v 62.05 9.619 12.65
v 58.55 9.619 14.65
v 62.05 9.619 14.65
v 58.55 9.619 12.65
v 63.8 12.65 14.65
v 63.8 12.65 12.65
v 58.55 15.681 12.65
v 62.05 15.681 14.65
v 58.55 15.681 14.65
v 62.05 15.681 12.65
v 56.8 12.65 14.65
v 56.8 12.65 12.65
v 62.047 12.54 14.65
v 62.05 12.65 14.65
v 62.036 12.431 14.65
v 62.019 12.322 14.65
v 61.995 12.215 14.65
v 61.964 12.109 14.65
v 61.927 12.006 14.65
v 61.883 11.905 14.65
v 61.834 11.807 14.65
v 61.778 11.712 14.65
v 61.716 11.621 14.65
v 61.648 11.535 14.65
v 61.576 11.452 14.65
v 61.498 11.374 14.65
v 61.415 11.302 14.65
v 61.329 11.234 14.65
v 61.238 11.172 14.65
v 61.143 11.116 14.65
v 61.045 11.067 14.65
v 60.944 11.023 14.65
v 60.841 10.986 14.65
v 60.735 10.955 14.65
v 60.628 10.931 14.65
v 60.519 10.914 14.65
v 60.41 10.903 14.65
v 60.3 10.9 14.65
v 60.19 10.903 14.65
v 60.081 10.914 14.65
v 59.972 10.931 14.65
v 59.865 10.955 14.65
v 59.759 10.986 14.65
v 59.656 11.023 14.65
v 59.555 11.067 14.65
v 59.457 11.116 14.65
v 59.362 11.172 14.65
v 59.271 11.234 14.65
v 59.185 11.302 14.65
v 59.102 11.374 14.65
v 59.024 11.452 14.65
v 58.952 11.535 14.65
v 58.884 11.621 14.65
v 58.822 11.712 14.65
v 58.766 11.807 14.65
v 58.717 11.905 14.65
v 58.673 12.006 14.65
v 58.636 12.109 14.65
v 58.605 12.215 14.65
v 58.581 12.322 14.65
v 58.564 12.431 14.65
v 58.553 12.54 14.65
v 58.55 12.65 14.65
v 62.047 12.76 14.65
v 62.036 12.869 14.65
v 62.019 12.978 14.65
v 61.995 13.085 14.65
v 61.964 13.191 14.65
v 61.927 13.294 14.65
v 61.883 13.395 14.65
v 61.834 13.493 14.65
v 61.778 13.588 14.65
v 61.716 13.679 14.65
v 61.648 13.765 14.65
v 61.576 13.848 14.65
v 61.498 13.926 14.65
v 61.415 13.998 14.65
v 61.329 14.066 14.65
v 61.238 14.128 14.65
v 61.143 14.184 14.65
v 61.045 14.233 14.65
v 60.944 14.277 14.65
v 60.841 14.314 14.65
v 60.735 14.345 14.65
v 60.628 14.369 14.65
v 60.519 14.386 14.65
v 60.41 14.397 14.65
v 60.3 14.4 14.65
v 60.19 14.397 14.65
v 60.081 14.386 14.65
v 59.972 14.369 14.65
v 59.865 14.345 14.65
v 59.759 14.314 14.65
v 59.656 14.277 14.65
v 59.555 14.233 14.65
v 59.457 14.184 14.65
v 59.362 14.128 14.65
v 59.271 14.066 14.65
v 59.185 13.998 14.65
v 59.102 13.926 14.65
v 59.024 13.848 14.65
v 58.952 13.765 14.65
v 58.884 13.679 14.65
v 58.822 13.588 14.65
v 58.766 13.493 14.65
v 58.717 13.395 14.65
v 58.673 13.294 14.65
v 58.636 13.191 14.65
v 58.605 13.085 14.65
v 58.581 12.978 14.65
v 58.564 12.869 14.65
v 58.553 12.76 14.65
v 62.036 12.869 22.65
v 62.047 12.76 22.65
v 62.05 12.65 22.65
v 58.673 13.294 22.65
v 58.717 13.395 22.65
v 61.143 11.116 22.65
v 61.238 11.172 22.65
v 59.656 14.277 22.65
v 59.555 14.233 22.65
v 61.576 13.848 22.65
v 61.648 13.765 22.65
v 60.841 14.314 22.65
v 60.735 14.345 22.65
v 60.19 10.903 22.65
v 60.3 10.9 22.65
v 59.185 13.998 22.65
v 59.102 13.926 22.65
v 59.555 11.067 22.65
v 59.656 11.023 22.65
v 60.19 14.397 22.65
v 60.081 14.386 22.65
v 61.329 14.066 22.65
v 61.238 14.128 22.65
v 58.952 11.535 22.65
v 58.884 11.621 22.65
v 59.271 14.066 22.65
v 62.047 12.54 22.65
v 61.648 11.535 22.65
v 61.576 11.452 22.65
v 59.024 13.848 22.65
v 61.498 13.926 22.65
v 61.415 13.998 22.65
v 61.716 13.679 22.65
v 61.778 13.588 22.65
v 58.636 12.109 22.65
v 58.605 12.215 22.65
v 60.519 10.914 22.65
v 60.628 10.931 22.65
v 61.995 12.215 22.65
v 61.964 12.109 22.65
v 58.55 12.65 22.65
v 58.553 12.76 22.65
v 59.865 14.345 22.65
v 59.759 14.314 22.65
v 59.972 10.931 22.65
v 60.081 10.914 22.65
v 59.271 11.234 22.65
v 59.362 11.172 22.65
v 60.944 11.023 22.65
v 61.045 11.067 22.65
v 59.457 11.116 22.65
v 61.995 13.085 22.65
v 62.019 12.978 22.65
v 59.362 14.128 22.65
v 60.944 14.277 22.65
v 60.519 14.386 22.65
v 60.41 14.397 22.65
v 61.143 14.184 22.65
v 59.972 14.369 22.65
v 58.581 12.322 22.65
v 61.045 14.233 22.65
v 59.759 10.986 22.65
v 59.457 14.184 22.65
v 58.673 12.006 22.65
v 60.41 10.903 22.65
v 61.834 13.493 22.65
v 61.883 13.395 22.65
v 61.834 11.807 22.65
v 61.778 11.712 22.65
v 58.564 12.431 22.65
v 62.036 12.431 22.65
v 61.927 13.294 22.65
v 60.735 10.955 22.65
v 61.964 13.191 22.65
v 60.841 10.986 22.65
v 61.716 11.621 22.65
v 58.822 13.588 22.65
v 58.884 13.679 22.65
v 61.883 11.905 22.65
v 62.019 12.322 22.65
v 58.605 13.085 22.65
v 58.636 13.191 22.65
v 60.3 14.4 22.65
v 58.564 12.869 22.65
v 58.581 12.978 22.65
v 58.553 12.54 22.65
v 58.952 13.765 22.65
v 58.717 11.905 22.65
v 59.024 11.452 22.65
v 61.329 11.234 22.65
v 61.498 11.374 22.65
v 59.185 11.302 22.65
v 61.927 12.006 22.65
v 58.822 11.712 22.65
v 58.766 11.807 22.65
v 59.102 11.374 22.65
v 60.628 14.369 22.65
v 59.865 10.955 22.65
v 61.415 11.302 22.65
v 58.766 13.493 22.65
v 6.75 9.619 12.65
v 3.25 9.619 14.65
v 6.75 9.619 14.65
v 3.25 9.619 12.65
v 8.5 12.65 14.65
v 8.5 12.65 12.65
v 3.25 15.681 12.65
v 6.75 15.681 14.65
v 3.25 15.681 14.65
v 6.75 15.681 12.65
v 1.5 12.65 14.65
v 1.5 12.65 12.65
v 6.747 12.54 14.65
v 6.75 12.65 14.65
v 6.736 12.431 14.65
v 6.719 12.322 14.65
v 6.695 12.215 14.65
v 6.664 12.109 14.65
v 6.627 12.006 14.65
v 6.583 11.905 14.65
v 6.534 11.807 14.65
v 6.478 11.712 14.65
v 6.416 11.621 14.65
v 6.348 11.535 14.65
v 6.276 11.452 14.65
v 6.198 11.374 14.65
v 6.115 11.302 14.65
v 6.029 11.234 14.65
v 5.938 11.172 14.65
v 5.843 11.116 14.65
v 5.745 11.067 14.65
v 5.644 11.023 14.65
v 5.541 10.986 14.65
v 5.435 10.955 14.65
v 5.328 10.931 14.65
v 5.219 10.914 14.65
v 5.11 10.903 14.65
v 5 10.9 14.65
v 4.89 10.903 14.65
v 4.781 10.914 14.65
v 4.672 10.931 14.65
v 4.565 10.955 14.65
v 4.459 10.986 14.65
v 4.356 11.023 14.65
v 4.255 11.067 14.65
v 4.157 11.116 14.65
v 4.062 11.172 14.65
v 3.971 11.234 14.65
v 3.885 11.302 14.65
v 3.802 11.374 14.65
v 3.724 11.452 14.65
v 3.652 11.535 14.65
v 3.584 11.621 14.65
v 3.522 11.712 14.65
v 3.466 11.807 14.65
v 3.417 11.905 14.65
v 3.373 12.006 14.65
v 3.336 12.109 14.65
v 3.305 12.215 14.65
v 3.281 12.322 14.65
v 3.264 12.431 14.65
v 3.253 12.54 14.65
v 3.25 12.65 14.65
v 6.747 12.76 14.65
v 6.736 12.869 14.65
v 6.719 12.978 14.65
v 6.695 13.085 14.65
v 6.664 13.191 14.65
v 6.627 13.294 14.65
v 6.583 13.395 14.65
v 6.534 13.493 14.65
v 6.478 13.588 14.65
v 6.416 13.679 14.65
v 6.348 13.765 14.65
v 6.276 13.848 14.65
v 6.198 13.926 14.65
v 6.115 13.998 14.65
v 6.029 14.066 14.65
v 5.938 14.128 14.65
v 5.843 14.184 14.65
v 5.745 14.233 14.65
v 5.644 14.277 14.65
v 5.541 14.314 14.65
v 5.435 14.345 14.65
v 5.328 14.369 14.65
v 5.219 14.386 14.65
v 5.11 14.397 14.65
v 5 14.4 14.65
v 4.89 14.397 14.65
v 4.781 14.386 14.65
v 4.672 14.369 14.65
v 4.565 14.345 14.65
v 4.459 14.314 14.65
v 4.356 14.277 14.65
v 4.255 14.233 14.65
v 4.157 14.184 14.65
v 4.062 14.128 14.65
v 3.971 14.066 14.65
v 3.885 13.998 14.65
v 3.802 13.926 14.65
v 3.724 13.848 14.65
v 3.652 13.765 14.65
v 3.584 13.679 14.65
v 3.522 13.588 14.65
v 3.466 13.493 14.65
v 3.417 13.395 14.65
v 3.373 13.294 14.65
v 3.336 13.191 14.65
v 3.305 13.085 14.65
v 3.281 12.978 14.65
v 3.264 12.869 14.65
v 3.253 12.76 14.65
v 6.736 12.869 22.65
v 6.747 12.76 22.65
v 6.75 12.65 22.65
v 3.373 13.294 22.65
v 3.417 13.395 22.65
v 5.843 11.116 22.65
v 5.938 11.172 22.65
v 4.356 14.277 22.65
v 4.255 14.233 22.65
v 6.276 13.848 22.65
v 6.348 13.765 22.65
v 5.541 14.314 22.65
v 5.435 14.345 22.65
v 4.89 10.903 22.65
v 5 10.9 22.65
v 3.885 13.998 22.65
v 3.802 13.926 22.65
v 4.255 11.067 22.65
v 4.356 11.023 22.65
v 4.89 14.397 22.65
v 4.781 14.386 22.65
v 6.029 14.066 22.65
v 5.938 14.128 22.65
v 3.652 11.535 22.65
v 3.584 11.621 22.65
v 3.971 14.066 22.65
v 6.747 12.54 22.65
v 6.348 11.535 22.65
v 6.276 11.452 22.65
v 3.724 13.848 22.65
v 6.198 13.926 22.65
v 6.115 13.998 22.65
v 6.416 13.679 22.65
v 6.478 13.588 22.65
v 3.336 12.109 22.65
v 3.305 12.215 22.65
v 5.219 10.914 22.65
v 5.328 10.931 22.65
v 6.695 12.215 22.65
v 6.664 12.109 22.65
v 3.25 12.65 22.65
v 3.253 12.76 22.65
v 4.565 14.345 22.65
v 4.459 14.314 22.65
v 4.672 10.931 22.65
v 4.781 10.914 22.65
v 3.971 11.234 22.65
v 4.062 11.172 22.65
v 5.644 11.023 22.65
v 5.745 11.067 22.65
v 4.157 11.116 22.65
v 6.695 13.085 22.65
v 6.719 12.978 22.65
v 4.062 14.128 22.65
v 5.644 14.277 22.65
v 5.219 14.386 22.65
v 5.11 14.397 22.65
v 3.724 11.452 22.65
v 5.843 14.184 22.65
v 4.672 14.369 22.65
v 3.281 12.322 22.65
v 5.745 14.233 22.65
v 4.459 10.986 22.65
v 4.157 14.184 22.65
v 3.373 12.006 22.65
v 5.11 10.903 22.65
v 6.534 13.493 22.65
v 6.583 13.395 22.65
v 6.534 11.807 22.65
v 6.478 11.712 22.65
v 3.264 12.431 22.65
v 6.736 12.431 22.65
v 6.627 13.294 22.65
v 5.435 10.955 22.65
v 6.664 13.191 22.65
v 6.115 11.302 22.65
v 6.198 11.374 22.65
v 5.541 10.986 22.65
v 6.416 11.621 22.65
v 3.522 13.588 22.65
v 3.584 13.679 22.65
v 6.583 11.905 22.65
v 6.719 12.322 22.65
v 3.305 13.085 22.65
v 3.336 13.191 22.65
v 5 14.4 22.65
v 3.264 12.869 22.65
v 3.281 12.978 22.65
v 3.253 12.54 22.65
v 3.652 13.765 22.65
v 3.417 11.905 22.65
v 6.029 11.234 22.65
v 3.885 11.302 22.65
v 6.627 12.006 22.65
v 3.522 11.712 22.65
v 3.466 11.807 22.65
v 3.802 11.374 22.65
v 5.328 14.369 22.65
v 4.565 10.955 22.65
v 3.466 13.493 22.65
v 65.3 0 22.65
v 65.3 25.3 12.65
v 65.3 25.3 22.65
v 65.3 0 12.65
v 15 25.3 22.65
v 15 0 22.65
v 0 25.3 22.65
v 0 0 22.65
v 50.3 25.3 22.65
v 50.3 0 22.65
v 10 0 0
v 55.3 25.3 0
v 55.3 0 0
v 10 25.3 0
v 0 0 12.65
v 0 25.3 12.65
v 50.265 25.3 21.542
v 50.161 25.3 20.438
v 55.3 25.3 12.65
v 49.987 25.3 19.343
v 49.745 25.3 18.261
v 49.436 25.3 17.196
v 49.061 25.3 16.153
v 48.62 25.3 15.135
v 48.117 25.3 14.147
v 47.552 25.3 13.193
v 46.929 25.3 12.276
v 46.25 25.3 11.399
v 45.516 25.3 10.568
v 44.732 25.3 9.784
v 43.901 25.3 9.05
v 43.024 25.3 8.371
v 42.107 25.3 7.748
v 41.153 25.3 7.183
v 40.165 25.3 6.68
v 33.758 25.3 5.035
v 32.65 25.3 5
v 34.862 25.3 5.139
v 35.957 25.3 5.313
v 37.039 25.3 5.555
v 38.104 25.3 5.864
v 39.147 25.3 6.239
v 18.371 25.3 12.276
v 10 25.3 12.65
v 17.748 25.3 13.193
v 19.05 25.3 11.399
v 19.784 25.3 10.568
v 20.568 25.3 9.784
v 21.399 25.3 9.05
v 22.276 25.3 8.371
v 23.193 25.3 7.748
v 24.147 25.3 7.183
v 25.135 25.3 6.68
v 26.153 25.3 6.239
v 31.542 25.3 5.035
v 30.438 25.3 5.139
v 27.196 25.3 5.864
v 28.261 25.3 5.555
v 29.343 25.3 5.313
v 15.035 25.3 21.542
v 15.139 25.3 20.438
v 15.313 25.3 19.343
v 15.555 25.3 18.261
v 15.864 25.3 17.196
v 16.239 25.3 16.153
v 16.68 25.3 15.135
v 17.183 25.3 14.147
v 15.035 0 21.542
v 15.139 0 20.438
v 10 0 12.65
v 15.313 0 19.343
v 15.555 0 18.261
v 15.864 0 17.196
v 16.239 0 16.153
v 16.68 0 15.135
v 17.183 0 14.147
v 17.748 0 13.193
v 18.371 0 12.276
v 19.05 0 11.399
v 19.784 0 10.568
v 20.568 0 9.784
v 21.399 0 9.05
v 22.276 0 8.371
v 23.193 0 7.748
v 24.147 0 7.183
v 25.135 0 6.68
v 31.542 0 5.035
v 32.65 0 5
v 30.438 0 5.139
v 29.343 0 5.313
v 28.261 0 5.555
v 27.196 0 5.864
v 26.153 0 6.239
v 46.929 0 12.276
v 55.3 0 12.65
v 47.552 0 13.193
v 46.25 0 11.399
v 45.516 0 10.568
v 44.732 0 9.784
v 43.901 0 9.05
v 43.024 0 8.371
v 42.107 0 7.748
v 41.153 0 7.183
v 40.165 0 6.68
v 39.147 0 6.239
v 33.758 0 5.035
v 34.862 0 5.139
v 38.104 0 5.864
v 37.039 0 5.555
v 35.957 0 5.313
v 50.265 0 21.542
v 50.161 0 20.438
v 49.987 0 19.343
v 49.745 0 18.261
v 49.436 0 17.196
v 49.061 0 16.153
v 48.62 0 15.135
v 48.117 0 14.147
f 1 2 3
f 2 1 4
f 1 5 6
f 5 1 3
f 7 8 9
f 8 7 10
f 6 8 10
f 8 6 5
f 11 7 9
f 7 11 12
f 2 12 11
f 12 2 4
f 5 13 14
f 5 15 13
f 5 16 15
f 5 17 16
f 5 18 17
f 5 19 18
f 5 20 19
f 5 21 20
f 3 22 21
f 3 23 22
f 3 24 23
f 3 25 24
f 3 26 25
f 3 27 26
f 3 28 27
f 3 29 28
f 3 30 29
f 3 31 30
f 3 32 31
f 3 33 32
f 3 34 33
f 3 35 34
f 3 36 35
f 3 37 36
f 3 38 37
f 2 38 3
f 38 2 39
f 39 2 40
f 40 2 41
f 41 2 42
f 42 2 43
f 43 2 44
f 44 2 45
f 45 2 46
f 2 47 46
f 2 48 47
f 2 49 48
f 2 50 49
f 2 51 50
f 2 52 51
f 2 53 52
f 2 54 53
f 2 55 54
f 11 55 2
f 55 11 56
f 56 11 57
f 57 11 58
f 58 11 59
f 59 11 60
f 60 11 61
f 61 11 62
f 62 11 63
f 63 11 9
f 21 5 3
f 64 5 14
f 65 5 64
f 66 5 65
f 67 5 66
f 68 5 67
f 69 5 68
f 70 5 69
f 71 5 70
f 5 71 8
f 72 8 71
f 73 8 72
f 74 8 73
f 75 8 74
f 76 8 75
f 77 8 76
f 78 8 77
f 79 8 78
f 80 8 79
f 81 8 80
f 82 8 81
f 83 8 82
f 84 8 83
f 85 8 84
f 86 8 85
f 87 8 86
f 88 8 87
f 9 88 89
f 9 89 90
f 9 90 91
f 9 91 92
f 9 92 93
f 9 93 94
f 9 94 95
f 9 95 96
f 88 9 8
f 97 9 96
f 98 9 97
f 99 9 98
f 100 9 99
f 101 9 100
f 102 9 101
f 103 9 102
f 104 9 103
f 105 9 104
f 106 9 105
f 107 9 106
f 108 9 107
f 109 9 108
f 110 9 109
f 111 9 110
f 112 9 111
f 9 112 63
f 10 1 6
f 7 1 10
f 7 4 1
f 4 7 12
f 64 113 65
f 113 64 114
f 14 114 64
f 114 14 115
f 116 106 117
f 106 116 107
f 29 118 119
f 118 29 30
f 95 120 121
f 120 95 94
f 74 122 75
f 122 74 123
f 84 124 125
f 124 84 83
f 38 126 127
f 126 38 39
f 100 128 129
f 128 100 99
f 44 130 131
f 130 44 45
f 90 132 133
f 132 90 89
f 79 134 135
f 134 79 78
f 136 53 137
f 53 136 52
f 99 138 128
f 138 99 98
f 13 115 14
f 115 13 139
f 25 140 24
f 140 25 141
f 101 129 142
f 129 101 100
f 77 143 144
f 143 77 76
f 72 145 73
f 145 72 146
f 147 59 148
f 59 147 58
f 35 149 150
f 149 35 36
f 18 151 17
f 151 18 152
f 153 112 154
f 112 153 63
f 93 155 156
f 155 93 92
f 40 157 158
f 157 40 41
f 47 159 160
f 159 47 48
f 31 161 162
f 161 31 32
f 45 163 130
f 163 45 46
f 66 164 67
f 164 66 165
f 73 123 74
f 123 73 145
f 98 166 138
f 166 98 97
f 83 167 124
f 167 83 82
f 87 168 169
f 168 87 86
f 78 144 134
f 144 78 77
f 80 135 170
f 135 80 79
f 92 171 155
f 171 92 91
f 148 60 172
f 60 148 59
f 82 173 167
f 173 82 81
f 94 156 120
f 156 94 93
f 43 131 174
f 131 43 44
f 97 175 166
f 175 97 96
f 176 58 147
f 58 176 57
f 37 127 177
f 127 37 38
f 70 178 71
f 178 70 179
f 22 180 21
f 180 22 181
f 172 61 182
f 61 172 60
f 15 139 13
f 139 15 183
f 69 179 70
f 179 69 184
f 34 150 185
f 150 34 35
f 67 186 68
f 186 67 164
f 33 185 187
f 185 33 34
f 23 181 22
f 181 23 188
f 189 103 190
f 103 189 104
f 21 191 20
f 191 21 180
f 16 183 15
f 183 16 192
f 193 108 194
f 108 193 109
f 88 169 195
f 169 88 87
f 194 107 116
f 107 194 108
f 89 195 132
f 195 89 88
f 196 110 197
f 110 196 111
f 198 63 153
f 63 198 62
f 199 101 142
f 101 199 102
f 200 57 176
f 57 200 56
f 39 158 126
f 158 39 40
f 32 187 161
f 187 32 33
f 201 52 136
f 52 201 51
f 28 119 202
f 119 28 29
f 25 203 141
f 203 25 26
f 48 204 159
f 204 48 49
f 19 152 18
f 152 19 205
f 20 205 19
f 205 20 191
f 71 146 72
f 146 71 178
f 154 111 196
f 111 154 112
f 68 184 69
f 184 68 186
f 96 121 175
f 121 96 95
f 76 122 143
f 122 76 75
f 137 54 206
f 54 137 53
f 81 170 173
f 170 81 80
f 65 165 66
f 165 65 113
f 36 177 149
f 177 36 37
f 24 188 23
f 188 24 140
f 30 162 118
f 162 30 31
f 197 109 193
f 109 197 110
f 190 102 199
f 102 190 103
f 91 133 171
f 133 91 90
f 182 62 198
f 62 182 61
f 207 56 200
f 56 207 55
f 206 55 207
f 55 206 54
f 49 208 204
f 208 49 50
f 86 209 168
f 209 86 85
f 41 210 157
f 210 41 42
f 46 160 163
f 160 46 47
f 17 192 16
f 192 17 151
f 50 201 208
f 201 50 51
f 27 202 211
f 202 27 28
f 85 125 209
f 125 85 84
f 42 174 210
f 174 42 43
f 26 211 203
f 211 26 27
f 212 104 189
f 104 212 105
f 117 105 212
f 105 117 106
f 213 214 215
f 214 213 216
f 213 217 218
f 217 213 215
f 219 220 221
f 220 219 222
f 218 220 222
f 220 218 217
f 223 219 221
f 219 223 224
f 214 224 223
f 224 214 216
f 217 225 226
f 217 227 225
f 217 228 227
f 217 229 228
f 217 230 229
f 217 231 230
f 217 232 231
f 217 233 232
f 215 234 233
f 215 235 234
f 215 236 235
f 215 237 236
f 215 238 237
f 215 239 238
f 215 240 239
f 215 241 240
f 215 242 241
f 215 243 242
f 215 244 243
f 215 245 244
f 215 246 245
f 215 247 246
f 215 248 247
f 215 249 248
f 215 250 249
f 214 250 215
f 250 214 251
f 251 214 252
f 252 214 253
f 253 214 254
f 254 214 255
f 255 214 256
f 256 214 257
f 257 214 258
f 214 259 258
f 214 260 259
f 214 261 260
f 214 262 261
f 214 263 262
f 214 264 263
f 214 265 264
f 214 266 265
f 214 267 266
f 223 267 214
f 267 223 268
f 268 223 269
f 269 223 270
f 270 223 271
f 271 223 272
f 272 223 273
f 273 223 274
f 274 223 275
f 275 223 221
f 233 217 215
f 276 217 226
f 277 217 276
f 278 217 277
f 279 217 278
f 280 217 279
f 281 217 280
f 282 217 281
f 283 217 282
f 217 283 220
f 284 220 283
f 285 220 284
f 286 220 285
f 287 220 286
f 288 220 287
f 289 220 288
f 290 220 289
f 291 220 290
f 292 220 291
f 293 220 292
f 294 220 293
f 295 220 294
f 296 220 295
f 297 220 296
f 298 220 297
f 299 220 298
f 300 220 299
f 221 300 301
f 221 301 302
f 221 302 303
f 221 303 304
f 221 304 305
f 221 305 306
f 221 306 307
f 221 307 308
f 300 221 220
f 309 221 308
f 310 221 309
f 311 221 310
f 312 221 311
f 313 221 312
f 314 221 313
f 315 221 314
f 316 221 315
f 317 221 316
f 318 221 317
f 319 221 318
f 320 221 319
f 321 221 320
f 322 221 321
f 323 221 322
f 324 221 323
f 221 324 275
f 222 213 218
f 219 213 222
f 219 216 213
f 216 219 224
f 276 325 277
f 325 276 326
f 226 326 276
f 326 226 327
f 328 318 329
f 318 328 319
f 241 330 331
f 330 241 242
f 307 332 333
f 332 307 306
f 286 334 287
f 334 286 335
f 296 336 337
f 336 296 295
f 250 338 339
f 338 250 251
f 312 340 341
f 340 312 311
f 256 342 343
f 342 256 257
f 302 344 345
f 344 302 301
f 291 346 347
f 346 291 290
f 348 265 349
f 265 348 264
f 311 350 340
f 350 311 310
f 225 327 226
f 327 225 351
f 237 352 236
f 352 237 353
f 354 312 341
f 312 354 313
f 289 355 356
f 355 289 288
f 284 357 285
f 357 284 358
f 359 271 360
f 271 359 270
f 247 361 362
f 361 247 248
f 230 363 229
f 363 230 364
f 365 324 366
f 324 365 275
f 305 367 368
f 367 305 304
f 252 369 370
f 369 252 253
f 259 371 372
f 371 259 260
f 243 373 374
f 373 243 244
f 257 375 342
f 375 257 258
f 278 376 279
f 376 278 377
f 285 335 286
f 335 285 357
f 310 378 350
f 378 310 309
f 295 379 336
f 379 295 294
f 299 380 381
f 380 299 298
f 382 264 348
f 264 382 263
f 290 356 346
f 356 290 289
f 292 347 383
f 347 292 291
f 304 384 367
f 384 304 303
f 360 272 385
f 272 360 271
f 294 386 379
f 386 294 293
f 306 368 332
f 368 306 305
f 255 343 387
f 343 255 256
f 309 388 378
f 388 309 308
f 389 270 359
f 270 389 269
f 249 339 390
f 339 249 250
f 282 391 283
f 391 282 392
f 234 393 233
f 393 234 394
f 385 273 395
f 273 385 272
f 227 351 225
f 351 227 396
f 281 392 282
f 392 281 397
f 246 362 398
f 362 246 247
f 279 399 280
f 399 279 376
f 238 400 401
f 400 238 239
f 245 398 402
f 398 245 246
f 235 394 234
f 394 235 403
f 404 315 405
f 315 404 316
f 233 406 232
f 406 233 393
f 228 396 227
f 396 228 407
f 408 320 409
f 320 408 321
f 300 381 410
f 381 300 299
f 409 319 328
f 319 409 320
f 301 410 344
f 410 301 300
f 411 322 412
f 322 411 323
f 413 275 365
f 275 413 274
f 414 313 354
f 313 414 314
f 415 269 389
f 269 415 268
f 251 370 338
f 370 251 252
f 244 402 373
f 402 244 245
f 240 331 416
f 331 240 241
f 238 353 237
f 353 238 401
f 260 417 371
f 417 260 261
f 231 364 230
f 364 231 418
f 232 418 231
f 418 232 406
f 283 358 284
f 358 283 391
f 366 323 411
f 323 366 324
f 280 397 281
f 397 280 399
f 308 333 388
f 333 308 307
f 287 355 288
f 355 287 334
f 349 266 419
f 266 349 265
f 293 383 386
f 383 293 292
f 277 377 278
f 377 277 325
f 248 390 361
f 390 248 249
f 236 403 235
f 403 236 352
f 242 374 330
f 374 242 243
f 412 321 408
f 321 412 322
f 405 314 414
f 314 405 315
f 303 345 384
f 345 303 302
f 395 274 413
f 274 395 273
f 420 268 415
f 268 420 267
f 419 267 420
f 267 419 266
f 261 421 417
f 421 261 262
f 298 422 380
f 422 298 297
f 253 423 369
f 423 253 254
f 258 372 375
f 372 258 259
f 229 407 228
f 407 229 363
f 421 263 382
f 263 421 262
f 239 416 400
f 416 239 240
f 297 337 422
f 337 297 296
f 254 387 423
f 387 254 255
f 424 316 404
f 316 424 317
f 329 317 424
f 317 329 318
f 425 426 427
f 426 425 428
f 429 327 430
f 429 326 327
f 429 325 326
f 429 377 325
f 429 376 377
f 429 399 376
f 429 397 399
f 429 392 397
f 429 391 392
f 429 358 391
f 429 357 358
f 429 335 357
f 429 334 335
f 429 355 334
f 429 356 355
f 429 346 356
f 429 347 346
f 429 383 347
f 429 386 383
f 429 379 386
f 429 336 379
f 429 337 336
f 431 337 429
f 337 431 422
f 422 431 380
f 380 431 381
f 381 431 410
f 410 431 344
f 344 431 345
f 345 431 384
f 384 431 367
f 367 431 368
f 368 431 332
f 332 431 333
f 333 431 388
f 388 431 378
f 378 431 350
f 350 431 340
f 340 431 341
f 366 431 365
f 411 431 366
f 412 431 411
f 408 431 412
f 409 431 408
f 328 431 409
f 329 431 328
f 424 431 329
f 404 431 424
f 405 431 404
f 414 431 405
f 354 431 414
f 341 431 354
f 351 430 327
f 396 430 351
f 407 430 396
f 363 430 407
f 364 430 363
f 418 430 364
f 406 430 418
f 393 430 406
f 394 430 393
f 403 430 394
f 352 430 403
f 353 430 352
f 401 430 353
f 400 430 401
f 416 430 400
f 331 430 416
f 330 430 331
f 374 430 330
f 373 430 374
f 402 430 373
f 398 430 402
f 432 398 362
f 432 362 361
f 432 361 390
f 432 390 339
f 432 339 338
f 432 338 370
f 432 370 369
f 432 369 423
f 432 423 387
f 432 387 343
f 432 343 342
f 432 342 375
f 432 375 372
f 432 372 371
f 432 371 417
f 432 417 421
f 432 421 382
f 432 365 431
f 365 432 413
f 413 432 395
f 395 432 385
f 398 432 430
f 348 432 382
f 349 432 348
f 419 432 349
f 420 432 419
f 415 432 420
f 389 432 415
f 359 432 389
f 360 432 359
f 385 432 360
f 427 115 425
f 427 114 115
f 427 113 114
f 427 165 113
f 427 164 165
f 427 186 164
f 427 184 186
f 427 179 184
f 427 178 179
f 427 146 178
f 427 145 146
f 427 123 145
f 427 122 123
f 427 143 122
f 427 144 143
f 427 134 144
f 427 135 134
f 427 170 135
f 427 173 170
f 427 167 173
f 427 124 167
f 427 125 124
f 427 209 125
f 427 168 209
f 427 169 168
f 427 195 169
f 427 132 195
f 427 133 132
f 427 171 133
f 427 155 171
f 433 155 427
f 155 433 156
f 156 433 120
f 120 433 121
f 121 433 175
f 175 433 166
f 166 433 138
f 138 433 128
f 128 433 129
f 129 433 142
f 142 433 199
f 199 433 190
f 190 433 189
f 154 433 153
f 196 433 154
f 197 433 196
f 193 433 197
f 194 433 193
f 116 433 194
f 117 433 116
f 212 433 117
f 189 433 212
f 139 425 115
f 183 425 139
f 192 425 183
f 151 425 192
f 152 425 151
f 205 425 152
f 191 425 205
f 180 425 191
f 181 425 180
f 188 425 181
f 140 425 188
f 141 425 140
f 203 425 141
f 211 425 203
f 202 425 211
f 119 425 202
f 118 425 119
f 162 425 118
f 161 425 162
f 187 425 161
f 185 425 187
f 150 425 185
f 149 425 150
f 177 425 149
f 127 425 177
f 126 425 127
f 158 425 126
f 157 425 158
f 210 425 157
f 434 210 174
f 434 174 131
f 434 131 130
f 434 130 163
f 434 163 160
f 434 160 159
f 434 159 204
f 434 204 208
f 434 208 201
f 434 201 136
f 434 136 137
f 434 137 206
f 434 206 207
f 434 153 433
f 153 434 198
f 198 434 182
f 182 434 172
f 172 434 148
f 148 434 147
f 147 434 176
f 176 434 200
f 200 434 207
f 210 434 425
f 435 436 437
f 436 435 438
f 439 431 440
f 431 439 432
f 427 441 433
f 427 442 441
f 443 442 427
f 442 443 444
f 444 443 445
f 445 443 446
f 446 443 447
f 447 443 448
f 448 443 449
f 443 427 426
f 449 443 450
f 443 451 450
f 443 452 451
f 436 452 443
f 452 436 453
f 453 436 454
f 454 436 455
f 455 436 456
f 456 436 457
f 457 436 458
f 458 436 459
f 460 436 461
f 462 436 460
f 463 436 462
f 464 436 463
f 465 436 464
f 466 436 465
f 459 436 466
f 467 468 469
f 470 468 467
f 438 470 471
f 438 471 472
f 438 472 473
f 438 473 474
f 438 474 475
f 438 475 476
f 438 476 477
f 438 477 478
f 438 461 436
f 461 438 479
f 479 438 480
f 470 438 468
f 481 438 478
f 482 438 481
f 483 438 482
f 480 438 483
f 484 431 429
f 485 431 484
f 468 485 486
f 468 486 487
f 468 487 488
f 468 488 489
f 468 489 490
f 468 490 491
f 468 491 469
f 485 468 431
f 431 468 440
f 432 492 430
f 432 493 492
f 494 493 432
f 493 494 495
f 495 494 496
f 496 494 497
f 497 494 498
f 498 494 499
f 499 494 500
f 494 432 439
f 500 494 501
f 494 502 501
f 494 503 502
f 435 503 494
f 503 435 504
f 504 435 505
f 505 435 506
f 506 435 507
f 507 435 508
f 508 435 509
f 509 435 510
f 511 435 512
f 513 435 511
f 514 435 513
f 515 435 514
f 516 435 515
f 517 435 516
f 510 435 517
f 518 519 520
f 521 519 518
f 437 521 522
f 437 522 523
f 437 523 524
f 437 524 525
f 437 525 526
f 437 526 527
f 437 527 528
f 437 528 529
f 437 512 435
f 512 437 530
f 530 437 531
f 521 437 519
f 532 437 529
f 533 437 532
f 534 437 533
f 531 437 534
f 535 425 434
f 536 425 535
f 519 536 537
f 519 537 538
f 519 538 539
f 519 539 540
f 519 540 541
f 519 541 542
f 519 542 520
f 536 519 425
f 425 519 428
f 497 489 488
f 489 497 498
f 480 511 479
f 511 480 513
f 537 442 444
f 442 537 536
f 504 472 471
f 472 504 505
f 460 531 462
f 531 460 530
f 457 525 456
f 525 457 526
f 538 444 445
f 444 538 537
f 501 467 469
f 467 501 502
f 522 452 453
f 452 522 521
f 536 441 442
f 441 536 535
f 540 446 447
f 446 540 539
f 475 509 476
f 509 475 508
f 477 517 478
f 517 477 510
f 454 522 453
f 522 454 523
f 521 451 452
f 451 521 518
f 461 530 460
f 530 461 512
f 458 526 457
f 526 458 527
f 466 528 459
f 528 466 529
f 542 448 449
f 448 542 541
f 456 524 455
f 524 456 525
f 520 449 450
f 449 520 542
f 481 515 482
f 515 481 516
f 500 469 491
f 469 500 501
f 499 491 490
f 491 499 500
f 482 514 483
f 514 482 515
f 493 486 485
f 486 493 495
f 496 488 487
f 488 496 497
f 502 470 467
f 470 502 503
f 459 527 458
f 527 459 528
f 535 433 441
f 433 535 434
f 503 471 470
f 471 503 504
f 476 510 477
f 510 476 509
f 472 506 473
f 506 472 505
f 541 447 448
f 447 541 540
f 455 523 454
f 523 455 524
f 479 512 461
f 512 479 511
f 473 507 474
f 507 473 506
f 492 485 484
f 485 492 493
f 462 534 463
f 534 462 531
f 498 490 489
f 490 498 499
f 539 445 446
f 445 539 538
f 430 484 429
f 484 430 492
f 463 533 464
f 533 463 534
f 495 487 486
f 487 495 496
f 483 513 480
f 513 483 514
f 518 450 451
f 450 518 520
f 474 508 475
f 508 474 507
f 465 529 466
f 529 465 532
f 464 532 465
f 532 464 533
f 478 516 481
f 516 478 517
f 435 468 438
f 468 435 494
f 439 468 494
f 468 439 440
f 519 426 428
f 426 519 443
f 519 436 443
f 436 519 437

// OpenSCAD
bar_diameter = 35.3;
base_width = bar_diameter + 30;
base_depth = bar_diameter - 10;
base_height = bar_diameter / 2 + 5;
bar_rad = bar_diameter /2;

screw_diameter = 3.5;
screw_head = 7;

difference() {

		// base cube
	cube([base_width, base_depth, base_height]);

		// cylinder difference for handlbar
	translate([base_width / 2,base_depth + 1,bar_rad + 5])
		rotate([90,0,0]) cylinder(h=base_depth + 2, r=bar_rad, $fn=100);

		// cube difference to remove extra volume
	translate([0,0,0])
		cube([10,base_depth,base_height-10]);
	translate([base_width-10,0,0])
		cube([10,base_depth,base_height-10]);

		// screw hole
	translate([base_width -5,base_depth/2,base_height-10]) {
		cylinder(h=2, r=screw_head/2, $fn=6);
		cylinder(h=10, r=screw_diameter/2, $fn=100);
	}

	translate([5,base_depth/2,base_height-10]) {
		cylinder(h=2, r=screw_head/2, $fn=6);
		cylinder(h=10, r=screw_diameter/2, $fn=100);
	}
}
